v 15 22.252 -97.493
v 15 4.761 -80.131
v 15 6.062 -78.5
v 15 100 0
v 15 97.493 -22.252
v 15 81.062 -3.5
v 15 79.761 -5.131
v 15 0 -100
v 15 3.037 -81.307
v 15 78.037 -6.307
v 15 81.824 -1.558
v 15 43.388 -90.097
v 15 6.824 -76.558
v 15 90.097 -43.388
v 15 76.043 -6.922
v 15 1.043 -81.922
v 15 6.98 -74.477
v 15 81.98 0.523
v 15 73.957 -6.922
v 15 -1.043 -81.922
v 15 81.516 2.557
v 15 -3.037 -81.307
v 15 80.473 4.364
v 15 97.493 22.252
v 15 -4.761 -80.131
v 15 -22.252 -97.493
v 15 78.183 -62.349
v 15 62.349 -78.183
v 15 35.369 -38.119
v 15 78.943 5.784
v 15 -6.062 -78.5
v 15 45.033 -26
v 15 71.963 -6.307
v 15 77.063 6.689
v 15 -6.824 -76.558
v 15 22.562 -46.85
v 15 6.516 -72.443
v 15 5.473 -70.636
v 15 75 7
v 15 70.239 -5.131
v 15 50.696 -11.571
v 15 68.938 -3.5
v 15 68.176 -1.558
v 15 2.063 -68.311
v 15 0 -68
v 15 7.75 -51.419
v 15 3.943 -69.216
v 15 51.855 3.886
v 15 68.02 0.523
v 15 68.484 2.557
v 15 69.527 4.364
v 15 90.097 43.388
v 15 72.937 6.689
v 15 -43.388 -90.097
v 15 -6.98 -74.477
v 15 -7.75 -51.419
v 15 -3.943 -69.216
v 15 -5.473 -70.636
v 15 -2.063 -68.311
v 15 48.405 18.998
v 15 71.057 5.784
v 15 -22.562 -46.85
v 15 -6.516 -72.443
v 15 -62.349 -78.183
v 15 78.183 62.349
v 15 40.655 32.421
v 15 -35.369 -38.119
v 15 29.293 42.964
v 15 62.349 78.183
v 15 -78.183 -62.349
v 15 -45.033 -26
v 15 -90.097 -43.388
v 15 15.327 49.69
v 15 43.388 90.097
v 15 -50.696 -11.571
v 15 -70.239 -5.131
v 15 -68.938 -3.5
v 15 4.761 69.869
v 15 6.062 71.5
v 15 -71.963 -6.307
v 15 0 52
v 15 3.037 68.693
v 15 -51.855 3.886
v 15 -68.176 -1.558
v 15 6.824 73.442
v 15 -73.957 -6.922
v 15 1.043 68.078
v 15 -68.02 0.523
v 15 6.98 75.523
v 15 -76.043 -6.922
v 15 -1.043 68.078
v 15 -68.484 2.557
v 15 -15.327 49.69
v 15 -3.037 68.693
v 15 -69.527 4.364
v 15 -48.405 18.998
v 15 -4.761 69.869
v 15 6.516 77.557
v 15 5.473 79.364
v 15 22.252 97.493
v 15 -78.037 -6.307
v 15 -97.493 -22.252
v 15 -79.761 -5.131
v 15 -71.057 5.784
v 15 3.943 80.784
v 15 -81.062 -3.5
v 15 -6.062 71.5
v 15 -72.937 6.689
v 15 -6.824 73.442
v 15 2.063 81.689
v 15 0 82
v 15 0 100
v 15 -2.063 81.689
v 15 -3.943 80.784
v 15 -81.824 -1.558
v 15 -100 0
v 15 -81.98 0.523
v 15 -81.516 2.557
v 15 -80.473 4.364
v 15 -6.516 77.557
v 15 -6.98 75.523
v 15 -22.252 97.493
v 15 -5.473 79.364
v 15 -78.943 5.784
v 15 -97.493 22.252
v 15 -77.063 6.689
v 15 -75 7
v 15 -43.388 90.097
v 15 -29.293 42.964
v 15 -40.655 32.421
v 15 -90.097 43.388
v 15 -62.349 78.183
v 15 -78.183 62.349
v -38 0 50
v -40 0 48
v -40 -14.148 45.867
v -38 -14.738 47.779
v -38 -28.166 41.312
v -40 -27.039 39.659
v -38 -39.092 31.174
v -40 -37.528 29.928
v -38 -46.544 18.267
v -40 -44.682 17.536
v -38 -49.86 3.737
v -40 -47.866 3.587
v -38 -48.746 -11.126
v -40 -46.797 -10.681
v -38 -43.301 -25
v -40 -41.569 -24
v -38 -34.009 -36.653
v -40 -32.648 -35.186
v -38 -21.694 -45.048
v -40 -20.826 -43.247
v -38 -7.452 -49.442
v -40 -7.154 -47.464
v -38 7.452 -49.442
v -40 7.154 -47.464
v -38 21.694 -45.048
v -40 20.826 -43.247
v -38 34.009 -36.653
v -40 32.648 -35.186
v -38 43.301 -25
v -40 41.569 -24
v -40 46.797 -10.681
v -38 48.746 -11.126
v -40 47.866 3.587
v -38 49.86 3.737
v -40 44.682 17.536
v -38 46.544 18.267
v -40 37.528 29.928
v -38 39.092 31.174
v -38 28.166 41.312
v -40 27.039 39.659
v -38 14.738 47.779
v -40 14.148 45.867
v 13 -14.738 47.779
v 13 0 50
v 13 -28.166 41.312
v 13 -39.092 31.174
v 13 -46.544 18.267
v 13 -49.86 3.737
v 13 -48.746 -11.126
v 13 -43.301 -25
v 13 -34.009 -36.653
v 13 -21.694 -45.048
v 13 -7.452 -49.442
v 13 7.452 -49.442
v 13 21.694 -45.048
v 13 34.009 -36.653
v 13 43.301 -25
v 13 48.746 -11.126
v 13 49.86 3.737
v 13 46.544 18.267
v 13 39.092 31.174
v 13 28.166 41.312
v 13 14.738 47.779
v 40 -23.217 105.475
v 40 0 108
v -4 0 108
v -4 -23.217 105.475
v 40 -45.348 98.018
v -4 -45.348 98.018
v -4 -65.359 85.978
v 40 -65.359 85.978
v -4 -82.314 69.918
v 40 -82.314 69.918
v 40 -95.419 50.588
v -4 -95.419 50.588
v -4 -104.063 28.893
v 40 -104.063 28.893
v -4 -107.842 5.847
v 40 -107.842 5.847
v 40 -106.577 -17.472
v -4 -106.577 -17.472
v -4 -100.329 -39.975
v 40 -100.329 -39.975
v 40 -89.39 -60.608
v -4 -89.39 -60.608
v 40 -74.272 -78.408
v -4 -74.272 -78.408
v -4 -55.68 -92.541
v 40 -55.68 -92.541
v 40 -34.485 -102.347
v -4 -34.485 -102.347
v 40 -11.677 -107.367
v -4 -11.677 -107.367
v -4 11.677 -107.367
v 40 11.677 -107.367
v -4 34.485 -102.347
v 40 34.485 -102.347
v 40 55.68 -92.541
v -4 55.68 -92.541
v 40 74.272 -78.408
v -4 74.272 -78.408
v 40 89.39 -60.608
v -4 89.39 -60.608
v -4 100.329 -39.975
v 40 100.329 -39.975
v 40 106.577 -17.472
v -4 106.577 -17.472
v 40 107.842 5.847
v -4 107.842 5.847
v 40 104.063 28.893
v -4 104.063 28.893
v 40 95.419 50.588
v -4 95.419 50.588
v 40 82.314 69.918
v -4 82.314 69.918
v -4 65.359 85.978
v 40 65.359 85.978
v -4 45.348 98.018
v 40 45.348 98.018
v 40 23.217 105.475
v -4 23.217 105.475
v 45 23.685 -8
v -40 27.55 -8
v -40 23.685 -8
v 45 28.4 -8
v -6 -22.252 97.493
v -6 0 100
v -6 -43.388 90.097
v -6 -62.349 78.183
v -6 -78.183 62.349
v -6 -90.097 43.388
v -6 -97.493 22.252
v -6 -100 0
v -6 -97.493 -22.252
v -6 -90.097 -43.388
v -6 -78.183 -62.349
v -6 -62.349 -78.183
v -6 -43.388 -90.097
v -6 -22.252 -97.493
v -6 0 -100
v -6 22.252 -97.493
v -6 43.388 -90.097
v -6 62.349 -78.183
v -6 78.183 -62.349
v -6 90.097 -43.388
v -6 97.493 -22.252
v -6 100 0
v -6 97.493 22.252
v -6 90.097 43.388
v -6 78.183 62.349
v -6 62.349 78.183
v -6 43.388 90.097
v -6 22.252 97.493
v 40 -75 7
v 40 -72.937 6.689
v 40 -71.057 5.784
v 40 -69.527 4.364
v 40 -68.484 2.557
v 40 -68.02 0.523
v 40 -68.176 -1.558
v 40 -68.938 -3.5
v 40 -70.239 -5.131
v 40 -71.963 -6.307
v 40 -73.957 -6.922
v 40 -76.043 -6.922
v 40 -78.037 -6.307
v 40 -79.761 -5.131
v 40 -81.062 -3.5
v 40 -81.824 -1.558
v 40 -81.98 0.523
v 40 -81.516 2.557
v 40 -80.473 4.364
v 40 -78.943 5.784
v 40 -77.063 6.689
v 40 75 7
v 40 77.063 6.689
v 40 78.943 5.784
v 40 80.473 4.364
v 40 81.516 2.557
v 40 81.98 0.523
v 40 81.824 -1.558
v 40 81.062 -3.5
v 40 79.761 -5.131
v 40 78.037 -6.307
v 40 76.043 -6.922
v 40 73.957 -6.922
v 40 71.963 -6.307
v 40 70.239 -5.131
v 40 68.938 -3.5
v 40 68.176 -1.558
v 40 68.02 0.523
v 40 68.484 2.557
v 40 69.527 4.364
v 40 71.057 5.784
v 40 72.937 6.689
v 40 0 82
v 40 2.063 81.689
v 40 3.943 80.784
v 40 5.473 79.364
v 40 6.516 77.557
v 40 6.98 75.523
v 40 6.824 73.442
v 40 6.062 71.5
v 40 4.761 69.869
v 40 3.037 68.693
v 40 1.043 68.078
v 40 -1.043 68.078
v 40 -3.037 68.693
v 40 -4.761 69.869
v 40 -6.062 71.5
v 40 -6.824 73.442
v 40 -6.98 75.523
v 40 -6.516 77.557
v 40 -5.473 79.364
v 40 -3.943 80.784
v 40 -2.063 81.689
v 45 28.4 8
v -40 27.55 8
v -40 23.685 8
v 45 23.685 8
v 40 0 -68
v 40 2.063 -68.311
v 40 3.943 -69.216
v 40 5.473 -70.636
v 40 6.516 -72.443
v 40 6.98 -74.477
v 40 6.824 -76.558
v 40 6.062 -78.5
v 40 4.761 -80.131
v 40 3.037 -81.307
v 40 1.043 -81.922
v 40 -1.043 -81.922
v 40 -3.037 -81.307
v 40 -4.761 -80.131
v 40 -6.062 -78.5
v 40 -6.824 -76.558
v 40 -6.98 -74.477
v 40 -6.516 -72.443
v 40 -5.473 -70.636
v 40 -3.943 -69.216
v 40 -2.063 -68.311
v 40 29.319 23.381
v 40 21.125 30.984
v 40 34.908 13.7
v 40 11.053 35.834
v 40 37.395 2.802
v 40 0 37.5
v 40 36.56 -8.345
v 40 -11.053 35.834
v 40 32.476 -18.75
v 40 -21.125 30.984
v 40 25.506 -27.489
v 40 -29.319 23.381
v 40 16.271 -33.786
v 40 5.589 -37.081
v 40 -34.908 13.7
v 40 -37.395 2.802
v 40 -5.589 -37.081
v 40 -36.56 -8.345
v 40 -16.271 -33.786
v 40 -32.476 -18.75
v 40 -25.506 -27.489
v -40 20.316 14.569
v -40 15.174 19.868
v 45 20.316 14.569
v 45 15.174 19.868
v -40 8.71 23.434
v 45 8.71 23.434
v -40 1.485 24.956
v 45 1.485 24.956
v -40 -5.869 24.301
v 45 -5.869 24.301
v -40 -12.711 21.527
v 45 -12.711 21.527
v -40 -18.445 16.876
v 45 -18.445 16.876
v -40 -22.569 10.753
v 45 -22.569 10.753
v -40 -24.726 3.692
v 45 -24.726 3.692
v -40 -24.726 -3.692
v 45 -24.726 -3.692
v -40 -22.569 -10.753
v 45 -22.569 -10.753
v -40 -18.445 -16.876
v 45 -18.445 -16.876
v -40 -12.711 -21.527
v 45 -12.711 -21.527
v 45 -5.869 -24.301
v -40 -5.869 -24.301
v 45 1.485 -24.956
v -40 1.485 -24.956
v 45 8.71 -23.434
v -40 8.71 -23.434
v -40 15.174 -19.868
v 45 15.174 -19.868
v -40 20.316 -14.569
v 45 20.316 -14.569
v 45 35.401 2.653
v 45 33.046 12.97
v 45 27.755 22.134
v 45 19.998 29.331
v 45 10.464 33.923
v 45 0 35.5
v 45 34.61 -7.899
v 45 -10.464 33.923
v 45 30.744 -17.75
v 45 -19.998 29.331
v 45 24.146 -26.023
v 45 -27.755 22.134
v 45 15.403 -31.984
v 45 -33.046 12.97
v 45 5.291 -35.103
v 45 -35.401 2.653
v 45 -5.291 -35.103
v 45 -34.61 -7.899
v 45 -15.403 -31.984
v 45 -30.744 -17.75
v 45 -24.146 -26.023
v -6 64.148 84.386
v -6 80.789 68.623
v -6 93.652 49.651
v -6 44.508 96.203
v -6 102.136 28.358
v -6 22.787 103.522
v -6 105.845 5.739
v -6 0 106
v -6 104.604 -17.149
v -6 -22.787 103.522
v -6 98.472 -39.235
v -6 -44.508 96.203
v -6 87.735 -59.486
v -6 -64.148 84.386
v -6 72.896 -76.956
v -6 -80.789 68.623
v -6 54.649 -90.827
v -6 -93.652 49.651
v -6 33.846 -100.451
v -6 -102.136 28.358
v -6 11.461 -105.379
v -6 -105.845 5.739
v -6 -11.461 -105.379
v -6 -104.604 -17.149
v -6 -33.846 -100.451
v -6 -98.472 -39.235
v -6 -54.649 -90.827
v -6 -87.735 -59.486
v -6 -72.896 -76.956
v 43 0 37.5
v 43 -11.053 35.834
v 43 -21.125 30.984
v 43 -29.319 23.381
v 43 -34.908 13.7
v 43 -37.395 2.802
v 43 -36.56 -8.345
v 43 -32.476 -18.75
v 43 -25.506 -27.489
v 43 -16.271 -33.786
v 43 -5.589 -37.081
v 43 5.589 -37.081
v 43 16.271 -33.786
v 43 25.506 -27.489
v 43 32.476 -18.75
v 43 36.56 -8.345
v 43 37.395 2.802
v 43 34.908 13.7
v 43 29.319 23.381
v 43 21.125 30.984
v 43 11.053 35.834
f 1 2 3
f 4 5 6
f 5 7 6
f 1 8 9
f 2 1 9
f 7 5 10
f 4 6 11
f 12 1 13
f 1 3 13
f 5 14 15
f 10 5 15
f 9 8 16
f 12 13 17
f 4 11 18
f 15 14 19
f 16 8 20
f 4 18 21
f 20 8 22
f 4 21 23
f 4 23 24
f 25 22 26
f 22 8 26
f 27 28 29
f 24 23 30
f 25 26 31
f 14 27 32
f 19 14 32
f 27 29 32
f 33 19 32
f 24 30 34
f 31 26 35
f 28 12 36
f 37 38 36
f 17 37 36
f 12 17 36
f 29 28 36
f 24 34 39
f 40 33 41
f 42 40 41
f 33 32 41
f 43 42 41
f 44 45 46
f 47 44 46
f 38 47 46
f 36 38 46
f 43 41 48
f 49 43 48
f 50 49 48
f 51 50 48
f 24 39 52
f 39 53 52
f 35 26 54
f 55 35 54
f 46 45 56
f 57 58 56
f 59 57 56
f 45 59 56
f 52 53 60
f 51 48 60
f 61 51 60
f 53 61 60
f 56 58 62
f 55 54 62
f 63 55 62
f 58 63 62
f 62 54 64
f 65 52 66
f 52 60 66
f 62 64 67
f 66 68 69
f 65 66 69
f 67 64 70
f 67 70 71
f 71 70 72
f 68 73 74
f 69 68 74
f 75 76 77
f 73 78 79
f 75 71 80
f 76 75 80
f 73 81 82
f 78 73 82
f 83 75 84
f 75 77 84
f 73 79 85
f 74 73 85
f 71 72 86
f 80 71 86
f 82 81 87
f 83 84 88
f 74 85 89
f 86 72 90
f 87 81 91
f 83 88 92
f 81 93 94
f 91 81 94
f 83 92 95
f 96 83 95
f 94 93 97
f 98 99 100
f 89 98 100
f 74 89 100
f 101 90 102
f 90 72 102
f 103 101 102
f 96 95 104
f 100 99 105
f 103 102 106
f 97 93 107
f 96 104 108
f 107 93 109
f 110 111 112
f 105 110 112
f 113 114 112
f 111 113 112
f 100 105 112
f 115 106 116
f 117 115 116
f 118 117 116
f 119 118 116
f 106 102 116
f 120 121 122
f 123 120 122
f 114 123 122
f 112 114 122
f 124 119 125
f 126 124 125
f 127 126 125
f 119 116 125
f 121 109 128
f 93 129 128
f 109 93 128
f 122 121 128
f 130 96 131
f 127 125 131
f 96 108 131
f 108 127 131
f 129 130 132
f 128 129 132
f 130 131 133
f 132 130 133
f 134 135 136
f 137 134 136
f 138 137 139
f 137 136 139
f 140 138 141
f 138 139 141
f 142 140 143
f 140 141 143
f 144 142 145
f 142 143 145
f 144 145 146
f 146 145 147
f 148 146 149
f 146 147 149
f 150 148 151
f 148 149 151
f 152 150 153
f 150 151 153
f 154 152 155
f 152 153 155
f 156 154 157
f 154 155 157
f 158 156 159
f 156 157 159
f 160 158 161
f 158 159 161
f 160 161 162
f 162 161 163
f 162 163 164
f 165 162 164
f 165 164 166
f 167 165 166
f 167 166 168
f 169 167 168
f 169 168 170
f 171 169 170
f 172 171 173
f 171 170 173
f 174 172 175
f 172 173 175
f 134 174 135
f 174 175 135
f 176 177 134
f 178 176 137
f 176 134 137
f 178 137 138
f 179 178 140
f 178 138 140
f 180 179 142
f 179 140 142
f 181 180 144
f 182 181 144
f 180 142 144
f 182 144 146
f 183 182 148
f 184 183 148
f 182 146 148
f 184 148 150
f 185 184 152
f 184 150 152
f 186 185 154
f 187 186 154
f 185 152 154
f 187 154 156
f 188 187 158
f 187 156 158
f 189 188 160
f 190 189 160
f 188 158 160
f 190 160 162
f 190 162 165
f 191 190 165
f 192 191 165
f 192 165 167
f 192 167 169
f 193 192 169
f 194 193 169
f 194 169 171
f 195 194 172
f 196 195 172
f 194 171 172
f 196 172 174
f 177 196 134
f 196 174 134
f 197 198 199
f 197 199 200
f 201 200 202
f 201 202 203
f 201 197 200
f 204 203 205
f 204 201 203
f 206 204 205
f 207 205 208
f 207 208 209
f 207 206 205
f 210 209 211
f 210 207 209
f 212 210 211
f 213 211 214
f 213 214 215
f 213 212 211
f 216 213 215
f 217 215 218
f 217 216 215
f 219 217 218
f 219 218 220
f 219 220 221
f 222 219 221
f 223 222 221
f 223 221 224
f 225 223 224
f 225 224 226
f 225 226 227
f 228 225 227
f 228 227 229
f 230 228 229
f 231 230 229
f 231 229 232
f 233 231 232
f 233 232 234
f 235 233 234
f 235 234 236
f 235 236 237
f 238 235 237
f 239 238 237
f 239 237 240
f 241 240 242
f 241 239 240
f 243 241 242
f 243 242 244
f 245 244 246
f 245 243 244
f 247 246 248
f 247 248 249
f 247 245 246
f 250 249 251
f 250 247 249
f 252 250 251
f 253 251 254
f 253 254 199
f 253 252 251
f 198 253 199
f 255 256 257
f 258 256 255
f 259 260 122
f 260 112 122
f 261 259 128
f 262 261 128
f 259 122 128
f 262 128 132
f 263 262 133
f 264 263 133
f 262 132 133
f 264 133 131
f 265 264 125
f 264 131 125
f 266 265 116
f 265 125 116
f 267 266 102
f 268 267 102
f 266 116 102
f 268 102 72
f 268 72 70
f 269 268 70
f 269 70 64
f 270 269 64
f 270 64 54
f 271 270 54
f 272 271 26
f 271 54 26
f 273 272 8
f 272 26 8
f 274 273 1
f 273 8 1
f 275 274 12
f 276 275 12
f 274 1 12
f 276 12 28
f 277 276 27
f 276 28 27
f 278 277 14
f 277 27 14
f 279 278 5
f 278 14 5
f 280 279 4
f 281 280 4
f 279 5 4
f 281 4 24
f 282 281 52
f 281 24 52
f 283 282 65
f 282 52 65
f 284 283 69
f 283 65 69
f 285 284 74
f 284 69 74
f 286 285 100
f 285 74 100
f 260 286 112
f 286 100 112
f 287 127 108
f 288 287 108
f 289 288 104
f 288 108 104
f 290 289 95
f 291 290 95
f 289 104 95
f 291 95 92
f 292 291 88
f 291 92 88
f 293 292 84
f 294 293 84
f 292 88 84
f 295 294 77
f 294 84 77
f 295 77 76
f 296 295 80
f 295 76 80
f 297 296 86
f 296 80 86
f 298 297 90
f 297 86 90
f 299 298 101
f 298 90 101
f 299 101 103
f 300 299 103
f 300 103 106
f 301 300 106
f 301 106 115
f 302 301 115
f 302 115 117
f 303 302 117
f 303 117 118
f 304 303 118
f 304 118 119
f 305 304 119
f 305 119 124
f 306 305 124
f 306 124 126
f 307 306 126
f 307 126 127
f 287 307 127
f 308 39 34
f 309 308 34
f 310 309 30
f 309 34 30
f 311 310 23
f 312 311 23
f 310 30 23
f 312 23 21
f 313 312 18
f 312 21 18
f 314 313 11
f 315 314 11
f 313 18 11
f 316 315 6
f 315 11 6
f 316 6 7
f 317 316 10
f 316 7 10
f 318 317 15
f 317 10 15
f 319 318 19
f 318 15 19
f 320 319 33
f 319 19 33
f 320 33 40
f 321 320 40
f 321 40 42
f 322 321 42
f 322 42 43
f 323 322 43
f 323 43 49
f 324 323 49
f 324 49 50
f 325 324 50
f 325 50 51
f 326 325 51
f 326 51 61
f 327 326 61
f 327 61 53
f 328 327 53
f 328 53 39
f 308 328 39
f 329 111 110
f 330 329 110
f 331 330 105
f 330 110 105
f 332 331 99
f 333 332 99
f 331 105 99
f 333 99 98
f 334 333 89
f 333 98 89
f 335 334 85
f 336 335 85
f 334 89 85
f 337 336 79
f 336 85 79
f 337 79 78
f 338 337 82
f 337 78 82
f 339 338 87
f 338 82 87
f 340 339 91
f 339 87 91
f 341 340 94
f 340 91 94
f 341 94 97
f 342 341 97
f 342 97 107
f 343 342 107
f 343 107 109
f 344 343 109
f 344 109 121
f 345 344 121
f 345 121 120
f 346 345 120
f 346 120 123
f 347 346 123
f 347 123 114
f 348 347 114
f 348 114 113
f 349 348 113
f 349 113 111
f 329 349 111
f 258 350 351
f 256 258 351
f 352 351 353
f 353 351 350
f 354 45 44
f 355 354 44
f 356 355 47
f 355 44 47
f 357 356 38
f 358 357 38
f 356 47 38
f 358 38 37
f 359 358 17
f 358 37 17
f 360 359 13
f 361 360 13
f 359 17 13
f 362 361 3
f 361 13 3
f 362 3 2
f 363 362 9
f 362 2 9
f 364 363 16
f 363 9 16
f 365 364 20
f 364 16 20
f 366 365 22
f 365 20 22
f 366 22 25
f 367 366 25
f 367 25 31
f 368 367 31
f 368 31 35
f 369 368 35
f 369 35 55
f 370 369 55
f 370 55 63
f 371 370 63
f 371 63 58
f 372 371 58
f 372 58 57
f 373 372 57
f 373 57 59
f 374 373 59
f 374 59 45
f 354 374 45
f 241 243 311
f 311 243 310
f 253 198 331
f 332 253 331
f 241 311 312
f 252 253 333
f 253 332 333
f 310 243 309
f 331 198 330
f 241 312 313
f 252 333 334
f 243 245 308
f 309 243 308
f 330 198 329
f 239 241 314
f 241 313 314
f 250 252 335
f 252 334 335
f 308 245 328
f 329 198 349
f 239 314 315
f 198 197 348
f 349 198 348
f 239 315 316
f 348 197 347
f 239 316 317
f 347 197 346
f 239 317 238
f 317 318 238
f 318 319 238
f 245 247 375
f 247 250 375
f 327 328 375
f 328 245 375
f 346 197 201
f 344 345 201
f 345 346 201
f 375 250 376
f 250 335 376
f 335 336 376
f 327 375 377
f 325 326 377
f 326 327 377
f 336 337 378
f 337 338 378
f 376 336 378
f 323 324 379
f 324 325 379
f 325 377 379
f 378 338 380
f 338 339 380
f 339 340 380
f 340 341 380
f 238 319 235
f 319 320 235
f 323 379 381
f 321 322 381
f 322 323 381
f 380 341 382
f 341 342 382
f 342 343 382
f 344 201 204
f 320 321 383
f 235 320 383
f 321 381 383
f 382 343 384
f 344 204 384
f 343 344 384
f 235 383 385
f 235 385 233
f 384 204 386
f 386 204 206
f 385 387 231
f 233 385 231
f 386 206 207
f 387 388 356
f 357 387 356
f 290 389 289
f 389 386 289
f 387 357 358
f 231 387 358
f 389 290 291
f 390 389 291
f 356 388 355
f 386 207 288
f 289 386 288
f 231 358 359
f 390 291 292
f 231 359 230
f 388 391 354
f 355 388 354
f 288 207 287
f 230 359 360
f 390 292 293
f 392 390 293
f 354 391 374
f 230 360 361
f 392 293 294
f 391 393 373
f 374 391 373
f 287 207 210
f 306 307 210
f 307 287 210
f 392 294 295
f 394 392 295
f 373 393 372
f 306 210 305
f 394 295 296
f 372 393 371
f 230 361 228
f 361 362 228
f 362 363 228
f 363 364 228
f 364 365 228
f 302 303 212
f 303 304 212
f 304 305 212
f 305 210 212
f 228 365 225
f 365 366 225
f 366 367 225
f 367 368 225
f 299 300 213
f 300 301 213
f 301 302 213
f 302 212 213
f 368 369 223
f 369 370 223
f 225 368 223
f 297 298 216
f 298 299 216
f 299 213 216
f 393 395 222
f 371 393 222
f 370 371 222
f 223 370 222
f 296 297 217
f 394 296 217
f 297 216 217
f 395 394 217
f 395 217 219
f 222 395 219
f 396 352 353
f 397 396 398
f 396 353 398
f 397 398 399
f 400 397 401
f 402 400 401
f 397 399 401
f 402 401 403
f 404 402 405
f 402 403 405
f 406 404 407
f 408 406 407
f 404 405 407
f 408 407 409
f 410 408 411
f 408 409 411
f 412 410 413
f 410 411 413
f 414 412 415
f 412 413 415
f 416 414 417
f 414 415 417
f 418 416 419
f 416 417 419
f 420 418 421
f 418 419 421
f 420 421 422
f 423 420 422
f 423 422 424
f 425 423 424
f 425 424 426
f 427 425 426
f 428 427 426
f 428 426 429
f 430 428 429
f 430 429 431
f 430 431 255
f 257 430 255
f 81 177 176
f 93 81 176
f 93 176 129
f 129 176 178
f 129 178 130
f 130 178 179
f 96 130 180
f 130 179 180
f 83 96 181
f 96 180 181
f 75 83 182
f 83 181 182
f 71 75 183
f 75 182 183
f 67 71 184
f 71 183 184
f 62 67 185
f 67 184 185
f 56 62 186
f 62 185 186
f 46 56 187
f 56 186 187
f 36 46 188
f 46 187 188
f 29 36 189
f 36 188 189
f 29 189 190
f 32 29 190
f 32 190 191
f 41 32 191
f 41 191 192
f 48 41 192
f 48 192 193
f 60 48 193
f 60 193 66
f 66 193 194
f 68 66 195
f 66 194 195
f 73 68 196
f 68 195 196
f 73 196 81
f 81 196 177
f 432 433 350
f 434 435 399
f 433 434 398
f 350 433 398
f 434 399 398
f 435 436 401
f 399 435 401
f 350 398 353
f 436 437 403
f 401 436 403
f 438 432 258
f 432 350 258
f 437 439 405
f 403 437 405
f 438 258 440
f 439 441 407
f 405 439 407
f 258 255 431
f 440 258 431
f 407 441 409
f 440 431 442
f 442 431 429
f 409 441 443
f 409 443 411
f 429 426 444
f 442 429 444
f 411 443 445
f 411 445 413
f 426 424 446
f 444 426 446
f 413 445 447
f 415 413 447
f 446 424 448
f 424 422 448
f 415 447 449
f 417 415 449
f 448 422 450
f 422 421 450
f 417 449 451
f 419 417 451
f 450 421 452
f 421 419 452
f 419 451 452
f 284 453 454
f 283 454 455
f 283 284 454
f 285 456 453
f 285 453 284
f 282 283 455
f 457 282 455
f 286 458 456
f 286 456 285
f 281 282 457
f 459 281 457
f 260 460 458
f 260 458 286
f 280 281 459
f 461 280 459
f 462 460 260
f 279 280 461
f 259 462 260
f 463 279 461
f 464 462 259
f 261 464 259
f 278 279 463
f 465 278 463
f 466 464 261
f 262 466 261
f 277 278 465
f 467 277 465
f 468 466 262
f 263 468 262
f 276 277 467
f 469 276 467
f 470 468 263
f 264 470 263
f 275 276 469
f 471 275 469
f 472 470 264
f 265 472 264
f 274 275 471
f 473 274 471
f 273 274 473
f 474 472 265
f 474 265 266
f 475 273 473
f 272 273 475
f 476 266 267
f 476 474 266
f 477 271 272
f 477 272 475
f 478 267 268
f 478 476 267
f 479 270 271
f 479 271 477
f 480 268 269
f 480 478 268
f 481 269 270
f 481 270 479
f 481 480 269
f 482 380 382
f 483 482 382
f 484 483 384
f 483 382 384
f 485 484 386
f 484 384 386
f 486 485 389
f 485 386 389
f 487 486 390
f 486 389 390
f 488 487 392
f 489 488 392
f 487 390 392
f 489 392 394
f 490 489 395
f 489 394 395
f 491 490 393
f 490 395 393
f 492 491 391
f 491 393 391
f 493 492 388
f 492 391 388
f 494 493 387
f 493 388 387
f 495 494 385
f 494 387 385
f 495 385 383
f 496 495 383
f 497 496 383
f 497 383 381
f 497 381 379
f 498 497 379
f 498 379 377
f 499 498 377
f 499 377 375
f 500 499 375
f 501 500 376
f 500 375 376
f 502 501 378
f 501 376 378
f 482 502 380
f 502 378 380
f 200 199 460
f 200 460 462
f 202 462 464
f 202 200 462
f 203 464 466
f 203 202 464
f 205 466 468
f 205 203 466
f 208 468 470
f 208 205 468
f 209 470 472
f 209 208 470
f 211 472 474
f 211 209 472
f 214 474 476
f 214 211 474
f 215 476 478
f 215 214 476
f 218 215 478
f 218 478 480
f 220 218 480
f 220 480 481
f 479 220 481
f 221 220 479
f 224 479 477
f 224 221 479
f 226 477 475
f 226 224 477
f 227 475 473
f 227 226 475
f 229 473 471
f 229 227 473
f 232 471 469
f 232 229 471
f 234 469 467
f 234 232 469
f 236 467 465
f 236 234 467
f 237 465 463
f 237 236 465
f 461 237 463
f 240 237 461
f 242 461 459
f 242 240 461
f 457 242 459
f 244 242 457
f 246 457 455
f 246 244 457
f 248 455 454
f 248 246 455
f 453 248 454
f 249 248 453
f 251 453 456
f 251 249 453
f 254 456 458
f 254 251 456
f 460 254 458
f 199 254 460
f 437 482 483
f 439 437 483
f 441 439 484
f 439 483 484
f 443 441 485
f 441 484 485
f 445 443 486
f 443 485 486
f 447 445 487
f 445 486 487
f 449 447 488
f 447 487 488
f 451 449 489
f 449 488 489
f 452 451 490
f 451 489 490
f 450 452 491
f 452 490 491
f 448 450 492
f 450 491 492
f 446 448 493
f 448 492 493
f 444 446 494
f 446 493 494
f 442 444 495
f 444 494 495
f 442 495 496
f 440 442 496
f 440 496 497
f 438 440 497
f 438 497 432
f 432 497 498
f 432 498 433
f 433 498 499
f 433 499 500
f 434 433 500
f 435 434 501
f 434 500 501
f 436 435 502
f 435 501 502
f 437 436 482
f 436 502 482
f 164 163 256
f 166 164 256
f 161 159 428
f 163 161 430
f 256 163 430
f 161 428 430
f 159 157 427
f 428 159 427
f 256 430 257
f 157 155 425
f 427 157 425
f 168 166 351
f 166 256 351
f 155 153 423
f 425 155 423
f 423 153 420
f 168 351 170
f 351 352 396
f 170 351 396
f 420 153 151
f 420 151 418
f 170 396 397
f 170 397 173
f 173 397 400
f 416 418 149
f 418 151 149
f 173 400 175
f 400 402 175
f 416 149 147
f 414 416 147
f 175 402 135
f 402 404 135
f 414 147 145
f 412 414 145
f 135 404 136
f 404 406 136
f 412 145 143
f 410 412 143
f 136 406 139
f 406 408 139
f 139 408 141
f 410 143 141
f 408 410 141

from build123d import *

# Parameters (mm, degrees)
M16X2_0_TAPPED_HOLE1_D = 14
SKETCH4_W              = 21
SKETCH4_H              = 8
CUT_EXTRUDE1_DEPTH     = 8
CHAMFER2_SIZE          = 2


with BuildPart() as part:
    # Sketch1 → Revolve1 (revolve)
    with BuildSketch(Plane.XY, mode=Mode.PRIVATE) as revolve1_sk:
        Polygon((-40, 25), (40, 25), (45, 25), (45, 37.5), (40, 37.5), (40, 108), (15, 108), (15, 50), (-40, 50), align=None)
    revolve(revolve1_sk.sketch.rotate(Axis((-40, 0, 0), (1, 0, 0)), 90), axis=Axis((-40, 0, 0), (1, 0, 0)))

    # M16x2.0 Tapped Hole1 (through all)
    with Locations(Plane(origin=(40, 0, 0), x_dir=(0, 0, -1), z_dir=(1, 0, 0))):
        with Locations((-75, 0), (0, 75), (75, 0), (0, -75)):
            Hole(M16X2_0_TAPPED_HOLE1_D / 2)

    # Sketch4 → Revolve2 (revolve)
    with BuildSketch(Plane.XY, mode=Mode.PRIVATE) as revolve2_sk:
        with Locations((4.5, 104)):
            Rectangle(SKETCH4_W, SKETCH4_H)
    revolve(revolve2_sk.sketch.rotate(Axis((0, 0, 0), (1, 0, 0)), 90), axis=Axis((0, 0, 0), (1, 0, 0)))

    # Sketch5 → Cut-Extrude1 (cut, symmetric)
    with BuildSketch(Plane.XY):
        Polygon((-40, 0), (45, 0), (45, 28.4), (-40, 27.55), align=None)
    extrude(amount=CUT_EXTRUDE1_DEPTH, both=True, mode=Mode.SUBTRACT)

    # Chamfer2
    chamfer2_edges = [part.edges().sort_by_distance(p)[0] for p in [
        (45, 0, -37.5),
        (-6, 0, -108),
        (-40, 0, -50),
        (15, 0, -50),
    ]]
    chamfer(chamfer2_edges, length=CHAMFER2_SIZE)


solid = part.part
